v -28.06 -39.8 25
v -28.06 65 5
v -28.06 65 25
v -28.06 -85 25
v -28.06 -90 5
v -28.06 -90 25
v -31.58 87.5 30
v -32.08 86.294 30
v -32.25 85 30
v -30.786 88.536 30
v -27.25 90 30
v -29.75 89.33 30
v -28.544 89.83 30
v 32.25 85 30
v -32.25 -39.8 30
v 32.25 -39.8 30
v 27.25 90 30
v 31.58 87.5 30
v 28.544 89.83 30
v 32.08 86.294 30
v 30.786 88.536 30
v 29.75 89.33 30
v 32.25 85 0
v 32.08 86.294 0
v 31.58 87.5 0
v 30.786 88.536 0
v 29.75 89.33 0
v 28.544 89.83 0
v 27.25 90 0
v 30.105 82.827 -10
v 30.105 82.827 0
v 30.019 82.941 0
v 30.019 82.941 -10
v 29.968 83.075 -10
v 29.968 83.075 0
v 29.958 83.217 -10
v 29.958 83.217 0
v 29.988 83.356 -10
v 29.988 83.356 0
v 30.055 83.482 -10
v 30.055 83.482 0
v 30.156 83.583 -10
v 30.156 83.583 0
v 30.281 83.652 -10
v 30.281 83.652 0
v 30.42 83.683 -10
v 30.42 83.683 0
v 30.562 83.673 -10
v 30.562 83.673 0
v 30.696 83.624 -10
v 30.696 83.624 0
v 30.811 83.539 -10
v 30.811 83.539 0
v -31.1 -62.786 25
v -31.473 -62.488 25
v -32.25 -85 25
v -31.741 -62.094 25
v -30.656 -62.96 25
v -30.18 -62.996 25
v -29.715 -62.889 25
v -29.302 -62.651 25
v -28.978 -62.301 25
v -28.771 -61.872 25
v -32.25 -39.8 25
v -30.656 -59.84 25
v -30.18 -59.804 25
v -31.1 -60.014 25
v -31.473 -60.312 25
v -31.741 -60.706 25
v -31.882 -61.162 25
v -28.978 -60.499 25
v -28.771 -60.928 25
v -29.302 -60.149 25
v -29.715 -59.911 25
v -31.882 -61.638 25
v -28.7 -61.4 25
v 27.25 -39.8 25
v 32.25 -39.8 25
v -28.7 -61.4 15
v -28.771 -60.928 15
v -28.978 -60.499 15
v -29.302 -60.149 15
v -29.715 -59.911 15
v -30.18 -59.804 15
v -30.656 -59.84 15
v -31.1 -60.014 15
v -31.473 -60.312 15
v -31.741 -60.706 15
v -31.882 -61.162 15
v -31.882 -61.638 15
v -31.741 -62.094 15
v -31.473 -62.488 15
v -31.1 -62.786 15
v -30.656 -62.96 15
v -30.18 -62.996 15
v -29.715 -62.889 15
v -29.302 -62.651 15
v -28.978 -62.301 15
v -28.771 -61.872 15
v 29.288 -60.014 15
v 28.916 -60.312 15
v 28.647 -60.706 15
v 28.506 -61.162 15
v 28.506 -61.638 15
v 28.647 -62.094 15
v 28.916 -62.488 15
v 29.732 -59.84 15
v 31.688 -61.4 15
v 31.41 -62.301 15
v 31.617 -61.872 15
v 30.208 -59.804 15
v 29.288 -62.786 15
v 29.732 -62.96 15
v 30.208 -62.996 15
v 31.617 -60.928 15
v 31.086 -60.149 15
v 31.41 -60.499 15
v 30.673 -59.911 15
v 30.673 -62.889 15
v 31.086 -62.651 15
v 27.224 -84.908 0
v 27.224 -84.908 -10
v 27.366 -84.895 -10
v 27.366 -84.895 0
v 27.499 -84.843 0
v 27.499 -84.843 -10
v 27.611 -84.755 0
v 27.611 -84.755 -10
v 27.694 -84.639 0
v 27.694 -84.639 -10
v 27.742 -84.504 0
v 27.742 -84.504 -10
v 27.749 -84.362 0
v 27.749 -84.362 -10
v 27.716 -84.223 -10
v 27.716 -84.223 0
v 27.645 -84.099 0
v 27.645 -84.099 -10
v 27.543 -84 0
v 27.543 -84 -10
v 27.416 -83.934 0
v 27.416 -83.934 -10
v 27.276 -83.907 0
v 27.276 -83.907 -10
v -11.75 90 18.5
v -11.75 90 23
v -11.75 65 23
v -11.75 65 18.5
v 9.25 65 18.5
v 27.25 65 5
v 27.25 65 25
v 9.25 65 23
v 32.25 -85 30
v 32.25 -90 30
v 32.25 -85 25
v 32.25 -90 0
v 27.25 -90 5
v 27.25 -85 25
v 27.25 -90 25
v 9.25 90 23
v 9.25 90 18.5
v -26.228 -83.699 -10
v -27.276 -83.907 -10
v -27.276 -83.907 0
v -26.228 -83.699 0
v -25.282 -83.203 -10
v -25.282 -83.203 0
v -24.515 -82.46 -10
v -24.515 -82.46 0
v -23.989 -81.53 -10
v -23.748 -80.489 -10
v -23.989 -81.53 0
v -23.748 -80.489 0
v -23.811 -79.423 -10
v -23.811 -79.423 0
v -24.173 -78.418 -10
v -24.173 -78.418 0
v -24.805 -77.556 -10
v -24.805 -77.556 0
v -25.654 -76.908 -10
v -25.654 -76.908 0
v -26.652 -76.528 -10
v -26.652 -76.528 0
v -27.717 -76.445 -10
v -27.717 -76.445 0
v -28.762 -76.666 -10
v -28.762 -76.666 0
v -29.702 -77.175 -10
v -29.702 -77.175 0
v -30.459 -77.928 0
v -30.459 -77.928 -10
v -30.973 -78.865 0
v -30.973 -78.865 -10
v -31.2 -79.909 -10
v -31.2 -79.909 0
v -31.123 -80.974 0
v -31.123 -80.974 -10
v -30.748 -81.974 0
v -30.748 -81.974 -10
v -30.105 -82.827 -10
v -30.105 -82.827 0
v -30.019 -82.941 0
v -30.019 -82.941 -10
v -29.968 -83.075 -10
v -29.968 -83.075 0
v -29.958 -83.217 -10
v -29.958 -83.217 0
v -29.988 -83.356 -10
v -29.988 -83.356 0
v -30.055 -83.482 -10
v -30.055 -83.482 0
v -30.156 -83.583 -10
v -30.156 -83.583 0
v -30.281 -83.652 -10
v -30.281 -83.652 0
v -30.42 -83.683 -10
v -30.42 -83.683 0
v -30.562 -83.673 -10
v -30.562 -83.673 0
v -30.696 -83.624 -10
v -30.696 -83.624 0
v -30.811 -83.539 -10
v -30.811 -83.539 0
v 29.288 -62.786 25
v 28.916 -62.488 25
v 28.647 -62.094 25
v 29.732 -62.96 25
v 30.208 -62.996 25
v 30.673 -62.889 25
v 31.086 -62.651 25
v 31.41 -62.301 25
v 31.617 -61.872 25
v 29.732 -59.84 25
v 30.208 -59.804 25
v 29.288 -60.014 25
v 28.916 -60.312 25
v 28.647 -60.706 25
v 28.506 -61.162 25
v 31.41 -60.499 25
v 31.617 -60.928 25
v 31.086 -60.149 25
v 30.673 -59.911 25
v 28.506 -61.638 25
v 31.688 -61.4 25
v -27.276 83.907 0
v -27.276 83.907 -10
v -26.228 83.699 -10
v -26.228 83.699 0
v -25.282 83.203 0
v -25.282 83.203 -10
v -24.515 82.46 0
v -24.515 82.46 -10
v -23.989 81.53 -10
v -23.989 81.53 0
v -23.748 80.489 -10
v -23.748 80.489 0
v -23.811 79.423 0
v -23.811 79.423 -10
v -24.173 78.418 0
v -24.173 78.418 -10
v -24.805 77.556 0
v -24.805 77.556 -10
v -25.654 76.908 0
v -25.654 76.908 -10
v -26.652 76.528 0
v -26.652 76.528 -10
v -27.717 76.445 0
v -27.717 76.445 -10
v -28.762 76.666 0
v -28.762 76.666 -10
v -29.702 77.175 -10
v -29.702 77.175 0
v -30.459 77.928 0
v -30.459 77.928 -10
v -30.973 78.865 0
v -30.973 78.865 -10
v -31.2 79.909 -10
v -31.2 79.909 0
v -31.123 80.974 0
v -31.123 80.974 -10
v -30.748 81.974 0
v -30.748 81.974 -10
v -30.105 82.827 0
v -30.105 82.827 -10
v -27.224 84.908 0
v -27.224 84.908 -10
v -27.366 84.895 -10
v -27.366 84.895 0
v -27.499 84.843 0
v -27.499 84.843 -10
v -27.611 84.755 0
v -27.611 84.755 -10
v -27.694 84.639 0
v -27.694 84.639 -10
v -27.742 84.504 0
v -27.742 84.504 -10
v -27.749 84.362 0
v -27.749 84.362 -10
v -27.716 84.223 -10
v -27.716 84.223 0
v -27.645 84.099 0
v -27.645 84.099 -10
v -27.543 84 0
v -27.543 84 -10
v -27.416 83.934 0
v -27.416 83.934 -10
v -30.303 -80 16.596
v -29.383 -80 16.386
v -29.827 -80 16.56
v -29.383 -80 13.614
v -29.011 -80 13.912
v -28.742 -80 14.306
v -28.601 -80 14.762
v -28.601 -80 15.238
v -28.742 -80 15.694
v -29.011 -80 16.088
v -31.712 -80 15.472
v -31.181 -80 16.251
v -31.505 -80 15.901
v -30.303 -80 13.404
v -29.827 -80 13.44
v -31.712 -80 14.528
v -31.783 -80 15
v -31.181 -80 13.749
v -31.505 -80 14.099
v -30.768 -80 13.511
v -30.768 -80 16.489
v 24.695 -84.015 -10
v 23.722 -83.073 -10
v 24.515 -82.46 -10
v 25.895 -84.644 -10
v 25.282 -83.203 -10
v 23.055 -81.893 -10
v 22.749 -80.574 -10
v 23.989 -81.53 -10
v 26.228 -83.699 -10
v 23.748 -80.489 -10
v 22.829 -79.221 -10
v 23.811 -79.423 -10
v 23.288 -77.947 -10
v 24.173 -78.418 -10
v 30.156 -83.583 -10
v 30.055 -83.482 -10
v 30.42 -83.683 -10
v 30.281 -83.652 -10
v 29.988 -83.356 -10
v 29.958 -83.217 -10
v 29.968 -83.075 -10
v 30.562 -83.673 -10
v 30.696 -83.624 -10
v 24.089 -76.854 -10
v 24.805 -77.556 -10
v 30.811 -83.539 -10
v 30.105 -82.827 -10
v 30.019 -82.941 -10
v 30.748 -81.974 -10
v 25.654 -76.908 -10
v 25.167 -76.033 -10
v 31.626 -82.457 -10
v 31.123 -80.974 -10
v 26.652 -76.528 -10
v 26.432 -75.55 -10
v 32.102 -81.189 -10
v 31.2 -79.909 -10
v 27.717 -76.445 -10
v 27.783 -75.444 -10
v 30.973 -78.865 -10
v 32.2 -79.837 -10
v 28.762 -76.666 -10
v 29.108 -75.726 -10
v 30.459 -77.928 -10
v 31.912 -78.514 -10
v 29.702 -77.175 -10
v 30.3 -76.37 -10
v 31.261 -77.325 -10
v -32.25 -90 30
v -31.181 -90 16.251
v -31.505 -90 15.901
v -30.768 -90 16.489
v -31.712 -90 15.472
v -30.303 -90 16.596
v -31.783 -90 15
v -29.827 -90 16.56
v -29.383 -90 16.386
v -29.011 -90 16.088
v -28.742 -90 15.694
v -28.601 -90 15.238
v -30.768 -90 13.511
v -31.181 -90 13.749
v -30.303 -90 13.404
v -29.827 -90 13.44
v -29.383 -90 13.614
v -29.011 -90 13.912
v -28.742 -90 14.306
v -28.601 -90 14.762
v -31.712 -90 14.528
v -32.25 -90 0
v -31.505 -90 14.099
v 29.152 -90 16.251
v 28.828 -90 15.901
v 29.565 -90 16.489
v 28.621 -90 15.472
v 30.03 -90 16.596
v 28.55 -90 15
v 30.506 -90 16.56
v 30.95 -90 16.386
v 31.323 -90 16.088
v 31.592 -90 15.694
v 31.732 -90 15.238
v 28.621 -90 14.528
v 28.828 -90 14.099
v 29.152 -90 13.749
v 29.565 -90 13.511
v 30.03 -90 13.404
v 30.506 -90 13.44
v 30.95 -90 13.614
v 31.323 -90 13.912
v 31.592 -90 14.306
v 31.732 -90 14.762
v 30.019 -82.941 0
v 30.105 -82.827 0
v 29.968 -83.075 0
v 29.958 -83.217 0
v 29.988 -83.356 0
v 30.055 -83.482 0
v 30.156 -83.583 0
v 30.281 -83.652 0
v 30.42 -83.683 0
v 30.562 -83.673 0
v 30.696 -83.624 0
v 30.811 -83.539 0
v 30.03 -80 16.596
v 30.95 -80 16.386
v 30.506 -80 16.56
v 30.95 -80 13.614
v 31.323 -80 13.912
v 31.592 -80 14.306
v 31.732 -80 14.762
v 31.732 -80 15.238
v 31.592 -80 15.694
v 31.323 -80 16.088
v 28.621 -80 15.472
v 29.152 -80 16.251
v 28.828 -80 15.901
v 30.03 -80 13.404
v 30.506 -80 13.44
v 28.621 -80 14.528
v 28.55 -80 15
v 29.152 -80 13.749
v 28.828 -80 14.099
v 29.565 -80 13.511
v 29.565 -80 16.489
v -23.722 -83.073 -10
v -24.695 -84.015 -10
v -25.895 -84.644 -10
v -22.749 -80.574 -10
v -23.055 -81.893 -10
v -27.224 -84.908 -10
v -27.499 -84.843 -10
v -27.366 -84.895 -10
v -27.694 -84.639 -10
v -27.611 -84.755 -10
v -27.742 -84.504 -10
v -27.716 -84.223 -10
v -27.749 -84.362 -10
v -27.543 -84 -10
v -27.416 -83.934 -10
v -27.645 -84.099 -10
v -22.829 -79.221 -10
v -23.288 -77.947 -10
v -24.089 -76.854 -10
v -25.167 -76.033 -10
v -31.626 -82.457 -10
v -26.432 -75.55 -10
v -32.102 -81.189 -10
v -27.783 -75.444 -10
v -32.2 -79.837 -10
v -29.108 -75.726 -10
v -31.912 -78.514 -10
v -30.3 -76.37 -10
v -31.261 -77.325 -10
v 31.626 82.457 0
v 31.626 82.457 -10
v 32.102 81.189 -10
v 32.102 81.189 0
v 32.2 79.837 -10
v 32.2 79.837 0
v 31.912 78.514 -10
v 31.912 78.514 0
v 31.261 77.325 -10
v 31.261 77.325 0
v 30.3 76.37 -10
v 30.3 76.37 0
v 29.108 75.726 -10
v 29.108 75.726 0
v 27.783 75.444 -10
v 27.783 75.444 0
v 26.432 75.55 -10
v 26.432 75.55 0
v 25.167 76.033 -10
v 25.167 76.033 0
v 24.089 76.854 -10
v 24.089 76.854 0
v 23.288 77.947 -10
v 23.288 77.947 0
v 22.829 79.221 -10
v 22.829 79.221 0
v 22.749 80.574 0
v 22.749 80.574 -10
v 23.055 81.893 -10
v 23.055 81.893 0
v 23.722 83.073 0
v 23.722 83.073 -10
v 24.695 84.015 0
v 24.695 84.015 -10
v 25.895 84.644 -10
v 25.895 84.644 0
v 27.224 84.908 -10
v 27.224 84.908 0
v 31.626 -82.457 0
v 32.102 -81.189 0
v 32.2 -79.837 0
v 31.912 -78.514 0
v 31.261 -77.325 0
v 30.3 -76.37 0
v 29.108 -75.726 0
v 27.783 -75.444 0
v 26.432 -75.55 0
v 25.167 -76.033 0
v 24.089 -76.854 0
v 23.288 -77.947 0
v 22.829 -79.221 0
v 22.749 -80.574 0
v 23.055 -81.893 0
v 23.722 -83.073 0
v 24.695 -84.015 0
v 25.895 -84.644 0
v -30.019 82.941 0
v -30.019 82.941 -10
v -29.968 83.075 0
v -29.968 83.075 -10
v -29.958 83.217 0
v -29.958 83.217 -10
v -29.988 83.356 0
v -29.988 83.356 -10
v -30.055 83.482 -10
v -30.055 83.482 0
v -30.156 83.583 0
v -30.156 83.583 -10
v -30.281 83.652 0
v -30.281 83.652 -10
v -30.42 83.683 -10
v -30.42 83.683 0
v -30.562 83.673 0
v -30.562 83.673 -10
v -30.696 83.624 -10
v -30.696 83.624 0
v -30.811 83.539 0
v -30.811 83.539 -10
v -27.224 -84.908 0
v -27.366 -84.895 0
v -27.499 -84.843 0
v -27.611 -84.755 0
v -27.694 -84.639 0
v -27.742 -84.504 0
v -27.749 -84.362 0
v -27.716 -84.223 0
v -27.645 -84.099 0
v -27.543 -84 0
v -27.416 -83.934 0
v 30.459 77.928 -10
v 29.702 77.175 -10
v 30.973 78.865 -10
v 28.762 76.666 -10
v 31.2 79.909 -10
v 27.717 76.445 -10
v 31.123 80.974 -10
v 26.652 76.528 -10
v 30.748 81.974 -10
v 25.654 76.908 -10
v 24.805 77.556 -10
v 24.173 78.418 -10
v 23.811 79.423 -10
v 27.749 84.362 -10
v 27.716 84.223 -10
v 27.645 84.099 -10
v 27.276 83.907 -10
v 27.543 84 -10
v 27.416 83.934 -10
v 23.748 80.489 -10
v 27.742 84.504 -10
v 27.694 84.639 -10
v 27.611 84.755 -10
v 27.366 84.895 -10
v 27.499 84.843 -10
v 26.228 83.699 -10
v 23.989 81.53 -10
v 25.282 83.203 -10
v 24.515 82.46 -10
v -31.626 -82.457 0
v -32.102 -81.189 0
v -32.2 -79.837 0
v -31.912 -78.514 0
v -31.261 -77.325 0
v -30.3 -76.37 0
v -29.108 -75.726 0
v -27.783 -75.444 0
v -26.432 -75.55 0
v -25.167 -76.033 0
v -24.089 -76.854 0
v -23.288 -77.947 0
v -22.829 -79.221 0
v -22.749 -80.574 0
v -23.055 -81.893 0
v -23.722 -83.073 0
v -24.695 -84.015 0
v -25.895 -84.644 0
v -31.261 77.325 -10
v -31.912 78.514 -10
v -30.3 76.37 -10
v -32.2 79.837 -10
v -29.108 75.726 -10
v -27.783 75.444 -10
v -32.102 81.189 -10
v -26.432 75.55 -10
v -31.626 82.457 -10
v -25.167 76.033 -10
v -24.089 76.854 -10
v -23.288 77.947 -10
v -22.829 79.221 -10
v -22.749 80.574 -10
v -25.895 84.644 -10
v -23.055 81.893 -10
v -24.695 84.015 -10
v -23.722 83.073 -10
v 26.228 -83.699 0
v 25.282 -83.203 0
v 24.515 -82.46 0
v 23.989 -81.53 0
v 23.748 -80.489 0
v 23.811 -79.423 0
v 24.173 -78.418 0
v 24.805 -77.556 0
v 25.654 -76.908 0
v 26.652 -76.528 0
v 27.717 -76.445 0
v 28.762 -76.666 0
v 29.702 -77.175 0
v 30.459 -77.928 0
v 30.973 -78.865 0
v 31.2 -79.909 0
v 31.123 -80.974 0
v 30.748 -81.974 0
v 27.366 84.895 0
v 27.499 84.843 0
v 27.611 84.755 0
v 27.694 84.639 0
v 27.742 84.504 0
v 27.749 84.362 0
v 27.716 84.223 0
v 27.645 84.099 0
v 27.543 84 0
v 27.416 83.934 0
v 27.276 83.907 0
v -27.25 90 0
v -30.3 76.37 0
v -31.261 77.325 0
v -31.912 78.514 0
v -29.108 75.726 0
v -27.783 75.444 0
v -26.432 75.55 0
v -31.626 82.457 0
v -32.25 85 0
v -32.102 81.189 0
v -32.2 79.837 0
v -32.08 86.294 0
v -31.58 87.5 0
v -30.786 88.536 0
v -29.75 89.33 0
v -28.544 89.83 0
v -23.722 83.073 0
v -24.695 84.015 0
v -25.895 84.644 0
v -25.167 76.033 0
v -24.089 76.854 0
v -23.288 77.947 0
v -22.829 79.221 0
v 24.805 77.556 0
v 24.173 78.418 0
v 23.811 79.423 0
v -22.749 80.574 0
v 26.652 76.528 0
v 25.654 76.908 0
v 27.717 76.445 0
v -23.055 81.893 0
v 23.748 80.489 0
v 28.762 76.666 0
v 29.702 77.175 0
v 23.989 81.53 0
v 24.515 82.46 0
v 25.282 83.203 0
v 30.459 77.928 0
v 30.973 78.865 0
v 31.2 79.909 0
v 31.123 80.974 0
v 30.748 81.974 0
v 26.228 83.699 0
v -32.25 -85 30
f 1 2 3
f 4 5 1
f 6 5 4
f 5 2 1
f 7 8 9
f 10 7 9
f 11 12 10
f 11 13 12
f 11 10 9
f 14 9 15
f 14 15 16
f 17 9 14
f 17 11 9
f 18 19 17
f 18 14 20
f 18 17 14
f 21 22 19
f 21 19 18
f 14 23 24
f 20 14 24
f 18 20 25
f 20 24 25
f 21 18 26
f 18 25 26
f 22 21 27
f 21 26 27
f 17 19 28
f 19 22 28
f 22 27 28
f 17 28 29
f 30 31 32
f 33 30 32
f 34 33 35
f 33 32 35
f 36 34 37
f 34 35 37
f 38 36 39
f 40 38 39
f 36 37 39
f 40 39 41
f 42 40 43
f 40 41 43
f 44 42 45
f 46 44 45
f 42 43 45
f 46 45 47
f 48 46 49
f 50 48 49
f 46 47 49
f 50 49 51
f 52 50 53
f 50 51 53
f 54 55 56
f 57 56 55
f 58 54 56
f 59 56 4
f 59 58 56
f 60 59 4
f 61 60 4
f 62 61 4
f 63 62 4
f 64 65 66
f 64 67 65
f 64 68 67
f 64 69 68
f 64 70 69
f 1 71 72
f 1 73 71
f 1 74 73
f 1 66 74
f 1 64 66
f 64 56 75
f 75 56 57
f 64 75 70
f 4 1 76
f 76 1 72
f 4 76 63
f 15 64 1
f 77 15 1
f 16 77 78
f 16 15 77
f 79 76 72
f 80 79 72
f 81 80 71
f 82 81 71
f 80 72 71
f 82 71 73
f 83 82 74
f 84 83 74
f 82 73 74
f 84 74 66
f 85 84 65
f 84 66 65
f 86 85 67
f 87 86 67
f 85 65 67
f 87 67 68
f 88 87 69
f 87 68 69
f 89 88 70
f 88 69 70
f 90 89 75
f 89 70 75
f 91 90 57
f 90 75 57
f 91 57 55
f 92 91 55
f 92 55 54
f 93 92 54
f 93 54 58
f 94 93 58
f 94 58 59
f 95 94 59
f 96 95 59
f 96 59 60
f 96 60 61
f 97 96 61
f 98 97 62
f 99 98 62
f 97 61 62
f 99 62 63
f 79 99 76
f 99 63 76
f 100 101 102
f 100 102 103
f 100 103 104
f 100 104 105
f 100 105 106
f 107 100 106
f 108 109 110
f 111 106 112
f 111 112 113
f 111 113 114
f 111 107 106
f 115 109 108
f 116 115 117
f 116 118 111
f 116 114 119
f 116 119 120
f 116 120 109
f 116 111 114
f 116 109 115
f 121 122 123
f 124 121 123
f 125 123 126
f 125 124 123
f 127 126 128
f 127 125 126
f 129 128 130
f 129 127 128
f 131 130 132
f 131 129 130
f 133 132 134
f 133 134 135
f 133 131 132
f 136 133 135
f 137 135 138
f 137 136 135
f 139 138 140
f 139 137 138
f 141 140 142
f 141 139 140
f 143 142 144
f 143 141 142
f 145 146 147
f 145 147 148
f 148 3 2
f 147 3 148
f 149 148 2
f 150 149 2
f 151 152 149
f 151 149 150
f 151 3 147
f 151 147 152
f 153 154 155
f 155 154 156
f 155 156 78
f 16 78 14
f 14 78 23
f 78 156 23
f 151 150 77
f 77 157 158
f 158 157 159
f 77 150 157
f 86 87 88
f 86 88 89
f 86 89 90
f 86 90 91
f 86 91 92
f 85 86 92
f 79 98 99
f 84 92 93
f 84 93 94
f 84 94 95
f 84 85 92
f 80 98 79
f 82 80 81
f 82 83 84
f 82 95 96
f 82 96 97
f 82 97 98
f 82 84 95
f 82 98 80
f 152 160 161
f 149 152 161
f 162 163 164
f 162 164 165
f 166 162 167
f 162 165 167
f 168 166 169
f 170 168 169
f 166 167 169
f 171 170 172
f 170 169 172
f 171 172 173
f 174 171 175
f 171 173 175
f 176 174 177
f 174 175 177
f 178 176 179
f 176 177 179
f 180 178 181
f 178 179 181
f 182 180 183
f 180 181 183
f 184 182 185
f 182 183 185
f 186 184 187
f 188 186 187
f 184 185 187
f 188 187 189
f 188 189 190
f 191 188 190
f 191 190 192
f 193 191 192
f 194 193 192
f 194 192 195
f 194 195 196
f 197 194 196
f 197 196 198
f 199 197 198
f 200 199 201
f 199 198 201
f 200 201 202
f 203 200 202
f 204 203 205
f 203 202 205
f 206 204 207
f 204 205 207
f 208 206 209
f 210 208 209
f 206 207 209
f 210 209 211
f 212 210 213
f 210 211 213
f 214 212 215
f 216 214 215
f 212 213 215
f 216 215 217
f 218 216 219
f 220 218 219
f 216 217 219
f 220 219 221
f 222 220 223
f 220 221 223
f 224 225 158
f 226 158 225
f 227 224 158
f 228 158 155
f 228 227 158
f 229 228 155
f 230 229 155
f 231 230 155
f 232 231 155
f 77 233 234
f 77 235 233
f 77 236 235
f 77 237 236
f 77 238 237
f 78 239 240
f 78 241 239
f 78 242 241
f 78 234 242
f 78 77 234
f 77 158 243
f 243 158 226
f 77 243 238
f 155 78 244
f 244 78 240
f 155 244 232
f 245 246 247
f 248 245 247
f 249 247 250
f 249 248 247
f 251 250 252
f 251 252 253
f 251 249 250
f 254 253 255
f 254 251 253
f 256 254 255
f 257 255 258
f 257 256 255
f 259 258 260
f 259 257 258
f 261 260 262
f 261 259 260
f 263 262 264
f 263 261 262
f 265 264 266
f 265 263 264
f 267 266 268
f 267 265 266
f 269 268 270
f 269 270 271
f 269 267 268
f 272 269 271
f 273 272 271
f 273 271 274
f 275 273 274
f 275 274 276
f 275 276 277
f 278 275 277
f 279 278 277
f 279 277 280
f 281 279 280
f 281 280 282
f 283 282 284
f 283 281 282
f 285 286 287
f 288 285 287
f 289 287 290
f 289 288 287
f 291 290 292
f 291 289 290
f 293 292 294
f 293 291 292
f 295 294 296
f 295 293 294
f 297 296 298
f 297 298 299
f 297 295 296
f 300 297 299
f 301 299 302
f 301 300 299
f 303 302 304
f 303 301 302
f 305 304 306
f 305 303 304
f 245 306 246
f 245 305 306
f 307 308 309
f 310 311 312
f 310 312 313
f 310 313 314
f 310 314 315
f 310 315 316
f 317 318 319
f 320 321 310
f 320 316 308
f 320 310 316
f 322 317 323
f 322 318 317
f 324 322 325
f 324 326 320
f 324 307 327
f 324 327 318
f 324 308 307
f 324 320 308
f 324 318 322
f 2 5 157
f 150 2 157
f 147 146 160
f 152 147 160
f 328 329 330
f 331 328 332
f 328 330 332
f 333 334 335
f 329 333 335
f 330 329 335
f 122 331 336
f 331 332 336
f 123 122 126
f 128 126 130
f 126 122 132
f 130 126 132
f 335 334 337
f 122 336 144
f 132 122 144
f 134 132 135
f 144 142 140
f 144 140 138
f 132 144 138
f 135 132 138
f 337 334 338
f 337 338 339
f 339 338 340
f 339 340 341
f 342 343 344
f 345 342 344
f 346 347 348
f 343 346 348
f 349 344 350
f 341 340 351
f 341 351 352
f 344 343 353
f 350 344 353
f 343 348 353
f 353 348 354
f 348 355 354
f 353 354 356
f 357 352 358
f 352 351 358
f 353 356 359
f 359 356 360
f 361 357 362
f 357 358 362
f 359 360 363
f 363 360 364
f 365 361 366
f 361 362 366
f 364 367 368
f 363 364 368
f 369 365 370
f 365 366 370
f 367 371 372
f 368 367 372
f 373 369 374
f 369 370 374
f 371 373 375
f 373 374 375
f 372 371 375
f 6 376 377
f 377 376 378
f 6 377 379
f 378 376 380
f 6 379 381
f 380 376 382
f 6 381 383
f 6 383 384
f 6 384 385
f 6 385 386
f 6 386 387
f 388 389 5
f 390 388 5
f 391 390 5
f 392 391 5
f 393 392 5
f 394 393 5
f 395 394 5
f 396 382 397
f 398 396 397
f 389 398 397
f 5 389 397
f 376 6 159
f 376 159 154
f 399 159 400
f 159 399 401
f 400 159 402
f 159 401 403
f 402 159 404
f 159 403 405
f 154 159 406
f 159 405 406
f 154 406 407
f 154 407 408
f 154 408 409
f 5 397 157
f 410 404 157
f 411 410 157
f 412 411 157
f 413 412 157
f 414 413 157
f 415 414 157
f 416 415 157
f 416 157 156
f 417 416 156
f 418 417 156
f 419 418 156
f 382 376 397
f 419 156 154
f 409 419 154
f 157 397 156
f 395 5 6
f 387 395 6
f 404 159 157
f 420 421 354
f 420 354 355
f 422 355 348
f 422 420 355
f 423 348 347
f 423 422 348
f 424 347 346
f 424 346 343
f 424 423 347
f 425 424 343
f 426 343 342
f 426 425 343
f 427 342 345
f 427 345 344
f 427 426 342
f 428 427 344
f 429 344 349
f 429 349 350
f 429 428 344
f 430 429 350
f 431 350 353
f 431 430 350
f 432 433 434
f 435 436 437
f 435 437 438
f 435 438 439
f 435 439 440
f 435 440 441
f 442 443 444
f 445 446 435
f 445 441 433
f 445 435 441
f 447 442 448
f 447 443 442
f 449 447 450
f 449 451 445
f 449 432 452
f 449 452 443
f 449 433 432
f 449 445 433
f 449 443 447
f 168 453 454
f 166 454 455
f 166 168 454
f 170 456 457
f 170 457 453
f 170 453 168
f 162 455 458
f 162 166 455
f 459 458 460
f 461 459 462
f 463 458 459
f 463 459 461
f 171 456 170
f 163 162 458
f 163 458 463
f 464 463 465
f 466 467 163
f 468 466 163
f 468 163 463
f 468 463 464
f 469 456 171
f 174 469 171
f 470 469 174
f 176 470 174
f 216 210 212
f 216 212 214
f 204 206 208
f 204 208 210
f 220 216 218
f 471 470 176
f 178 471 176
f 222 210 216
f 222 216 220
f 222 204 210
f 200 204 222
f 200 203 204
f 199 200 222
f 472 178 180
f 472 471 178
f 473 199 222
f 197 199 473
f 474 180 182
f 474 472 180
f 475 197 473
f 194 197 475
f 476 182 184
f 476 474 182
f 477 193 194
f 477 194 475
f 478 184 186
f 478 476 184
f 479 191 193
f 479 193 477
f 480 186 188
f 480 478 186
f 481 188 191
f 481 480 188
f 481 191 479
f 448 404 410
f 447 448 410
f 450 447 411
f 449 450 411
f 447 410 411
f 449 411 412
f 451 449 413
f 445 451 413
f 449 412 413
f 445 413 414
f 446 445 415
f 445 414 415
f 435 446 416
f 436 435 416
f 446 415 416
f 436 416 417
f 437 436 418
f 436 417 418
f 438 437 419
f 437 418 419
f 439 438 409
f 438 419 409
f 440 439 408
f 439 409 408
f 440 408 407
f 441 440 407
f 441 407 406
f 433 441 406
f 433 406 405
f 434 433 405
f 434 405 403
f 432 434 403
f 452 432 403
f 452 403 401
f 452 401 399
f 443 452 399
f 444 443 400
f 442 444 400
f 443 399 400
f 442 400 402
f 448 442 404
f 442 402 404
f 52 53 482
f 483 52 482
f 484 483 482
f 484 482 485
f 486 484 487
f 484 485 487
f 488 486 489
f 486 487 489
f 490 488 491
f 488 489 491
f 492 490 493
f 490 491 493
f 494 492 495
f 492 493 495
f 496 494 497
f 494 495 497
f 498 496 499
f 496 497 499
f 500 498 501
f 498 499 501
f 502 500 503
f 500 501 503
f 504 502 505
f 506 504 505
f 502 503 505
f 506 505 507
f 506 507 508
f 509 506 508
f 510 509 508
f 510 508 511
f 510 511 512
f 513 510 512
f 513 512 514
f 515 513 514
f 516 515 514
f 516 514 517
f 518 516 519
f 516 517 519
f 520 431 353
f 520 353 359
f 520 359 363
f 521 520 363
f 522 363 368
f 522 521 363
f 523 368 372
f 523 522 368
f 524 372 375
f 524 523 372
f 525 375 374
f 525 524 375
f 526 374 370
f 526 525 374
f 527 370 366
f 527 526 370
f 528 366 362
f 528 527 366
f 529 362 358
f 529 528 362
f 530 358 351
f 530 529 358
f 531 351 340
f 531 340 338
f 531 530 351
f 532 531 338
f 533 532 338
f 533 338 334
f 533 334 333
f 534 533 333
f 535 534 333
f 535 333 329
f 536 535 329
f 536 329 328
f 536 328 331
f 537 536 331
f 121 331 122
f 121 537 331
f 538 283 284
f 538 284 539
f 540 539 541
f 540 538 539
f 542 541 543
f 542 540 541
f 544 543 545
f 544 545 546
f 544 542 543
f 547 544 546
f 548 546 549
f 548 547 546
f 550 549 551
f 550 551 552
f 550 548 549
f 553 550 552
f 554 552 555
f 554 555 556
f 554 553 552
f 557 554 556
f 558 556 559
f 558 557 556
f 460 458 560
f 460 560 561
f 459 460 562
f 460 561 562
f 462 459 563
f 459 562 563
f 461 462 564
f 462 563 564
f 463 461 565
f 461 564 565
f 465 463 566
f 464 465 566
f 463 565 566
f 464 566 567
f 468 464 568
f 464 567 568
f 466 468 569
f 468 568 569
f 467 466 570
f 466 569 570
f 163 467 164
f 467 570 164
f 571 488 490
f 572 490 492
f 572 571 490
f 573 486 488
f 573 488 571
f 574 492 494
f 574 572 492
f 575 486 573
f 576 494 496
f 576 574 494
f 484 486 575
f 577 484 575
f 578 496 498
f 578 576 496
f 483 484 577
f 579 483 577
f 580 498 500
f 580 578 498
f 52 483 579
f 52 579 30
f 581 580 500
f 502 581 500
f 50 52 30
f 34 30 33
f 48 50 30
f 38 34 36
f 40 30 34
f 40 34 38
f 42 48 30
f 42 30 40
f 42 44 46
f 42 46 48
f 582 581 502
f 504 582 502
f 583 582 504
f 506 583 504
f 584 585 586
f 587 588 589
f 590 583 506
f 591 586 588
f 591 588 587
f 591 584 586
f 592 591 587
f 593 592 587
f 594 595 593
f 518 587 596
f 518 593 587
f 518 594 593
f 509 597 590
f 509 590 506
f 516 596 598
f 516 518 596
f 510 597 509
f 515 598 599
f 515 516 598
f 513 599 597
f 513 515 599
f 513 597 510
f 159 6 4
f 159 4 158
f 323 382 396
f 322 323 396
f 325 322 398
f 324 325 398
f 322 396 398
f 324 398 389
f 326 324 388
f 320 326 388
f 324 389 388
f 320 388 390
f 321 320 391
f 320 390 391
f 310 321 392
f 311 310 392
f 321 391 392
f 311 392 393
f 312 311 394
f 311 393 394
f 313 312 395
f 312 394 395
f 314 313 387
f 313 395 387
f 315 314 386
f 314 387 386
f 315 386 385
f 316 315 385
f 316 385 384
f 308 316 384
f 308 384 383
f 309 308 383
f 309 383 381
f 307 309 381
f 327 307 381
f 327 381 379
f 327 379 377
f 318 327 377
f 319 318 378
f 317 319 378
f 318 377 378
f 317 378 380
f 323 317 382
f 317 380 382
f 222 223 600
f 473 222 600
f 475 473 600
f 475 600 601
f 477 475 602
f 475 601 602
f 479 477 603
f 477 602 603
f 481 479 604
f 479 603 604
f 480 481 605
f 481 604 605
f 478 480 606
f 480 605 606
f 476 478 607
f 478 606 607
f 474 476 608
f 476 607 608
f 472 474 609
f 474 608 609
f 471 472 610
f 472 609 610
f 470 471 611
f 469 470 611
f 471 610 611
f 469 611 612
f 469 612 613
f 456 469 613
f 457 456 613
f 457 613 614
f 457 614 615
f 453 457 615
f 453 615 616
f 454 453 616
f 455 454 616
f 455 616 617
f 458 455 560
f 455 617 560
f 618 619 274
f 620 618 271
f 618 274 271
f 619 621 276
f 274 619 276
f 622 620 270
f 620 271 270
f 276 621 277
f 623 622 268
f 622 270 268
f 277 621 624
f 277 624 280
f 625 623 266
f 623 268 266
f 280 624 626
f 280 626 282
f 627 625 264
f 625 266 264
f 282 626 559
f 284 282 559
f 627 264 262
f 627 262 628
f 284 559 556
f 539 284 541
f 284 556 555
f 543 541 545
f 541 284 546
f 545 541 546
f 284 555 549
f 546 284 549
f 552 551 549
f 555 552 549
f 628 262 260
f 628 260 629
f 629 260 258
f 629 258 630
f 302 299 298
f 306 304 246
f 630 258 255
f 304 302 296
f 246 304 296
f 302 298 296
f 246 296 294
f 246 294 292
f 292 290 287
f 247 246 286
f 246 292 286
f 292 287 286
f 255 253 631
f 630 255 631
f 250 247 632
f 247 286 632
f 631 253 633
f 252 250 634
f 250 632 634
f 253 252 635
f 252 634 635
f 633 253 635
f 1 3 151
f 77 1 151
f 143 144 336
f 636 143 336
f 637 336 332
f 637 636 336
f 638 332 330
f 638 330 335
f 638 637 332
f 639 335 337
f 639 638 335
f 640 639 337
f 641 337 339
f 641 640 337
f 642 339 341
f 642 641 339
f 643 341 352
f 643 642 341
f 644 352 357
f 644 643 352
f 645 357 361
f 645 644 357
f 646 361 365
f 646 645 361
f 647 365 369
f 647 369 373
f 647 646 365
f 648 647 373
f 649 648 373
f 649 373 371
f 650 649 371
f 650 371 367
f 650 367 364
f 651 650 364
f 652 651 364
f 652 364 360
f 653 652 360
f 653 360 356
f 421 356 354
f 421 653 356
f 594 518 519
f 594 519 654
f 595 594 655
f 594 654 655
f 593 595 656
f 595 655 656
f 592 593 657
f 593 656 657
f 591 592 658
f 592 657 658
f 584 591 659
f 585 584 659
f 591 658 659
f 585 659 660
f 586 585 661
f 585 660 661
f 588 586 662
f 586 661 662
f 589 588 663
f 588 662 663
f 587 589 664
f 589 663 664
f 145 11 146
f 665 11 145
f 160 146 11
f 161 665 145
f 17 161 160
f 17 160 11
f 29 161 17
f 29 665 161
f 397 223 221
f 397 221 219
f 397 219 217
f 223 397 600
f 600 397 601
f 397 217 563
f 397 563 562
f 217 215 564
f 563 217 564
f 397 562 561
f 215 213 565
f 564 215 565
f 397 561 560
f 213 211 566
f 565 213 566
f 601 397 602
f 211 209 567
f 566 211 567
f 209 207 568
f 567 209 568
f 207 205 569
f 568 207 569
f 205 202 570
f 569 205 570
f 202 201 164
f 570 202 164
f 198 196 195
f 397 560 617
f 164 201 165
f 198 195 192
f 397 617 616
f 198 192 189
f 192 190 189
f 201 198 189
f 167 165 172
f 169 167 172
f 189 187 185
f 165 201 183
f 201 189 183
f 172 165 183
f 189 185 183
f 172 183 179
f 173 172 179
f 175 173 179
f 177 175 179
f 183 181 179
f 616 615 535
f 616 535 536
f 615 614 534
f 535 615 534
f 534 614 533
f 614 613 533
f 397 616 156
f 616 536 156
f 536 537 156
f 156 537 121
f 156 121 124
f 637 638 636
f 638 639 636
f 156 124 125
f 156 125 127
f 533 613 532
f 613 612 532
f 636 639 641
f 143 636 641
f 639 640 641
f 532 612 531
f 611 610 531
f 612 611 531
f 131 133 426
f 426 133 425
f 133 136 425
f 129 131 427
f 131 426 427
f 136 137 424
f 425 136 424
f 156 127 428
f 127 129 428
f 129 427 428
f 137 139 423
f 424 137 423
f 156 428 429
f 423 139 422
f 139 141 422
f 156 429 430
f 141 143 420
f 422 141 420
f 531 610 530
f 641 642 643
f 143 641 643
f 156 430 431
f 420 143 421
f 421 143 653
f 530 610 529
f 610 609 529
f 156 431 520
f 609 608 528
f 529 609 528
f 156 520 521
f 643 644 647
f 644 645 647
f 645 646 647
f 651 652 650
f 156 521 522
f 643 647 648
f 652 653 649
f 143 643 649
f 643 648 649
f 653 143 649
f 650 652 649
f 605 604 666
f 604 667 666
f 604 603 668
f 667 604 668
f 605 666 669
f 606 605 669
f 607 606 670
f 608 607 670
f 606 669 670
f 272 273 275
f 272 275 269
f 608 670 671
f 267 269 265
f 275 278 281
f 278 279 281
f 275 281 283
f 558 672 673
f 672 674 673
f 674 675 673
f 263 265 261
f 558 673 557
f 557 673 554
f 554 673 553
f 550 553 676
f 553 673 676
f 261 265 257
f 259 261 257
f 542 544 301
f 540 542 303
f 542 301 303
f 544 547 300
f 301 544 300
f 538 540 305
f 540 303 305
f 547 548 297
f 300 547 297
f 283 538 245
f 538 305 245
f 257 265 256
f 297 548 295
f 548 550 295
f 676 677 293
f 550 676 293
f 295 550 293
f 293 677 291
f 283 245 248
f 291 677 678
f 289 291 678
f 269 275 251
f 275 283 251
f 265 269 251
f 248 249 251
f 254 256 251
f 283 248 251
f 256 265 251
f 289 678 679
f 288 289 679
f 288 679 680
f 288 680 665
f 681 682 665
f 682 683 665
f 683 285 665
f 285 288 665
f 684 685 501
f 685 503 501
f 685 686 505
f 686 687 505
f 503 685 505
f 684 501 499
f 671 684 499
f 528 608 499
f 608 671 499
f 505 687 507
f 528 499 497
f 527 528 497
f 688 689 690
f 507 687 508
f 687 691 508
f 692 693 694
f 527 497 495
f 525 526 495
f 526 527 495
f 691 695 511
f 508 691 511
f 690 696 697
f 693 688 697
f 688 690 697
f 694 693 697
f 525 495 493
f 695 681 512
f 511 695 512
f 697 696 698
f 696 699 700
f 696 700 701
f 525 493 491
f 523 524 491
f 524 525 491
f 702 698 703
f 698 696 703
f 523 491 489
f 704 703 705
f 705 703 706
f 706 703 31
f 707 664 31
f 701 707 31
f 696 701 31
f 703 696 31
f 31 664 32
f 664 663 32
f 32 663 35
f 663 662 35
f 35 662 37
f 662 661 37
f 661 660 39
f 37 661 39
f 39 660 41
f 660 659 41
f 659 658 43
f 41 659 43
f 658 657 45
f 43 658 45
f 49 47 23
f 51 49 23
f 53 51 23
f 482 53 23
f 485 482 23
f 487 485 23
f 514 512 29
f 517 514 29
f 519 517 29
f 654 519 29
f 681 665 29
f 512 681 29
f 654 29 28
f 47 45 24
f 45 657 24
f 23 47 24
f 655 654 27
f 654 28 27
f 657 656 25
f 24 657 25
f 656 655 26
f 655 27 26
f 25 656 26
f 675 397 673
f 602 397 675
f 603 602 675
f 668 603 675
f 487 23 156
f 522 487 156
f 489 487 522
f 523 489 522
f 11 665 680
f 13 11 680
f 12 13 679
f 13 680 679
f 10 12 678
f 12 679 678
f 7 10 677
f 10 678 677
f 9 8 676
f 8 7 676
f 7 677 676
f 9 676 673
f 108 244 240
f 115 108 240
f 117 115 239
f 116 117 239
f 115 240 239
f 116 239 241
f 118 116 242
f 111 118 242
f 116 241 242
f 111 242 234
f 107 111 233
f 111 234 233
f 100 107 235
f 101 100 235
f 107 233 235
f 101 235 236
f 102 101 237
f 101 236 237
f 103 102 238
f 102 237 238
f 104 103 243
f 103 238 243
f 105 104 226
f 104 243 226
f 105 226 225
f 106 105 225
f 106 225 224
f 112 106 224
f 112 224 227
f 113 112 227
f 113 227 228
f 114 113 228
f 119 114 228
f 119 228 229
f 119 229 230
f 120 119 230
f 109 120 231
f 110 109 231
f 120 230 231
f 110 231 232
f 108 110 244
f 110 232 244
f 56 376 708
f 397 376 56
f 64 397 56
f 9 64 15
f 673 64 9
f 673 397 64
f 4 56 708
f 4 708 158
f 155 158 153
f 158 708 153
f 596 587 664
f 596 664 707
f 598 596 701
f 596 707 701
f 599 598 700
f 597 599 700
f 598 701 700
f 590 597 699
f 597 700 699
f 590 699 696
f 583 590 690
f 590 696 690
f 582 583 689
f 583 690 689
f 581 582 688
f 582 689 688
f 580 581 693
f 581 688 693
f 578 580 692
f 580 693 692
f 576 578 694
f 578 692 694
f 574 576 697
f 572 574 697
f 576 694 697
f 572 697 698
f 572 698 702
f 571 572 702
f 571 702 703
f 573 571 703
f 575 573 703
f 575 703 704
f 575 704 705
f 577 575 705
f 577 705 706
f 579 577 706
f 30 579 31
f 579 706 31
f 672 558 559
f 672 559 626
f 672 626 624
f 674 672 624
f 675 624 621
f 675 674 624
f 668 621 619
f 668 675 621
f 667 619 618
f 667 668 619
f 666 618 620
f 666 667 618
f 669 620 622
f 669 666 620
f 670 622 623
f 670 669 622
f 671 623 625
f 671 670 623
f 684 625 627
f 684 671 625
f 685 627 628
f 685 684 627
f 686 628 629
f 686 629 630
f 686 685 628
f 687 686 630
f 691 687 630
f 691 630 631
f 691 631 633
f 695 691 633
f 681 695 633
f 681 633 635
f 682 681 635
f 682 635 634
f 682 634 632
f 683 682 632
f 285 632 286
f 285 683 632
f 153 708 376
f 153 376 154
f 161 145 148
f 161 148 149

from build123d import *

# Parameters (mm, degrees)
CROQUIS1_W              = 64.5
CROQUIS1_H              = 180
SALIENTE_EXTRUIR1_DEPTH = 30
CROQUIS2_W              = 55.309973817
CROQUIS2_H              = 20
CORTAR_EXTRUIR1_DEPTH   = 155
CORTAR_EXTRUIR2_DEPTH   = 155
CORTAR_EXTRUIR4_DEPTH   = 155
CROQUIS12_R             = 1.6
CORTAR_EXTRUIR8_DEPTH   = 10
SALIENTE_EXTRUIR2_DEPTH = 10
CROQUIS9_W              = 64.5
CROQUIS9_H              = 45.2
CORTAR_EXTRUIR10_DEPTH  = 5
CROQUIS15_R             = 1.6
CORTAR_EXTRUIR11_DEPTH  = 10
CORTAR_EXTRUIR12_REACH  = 187.311
CROQUIS18_W             = 21
CROQUIS18_H             = 4.5


with BuildPart() as part:
    # Croquis1 → Saliente-Extruir1 (new body)
    with BuildSketch(Plane.XY):
        Rectangle(CROQUIS1_W, CROQUIS1_H)
    extrude(amount=SALIENTE_EXTRUIR1_DEPTH)

    # Croquis2 → Cortar-Extruir1 (cut)
    with BuildSketch(Plane.XZ.offset(90)):
        with Locations((-0.404986909, 15)):
            Rectangle(CROQUIS2_W, CROQUIS2_H)
    extrude(amount=-CORTAR_EXTRUIR1_DEPTH, mode=Mode.SUBTRACT)

    # Croquis3 → Cortar-Extruir2 (cut)
    with BuildSketch(Plane(origin=(0, 0, 0), x_dir=(-1, 0, 0), z_dir=(0, 0, -1))):
        with BuildLine():
            Line((-27.25, 90), (-32.25, 90))
            Line((-32.25, 90), (-32.25, 85))
            ThreePointArc((-32.25, 85), (-30.785533906, 88.535533906), (-27.25, 90))
        make_face()
    extrude(amount=-CORTAR_EXTRUIR2_DEPTH, mode=Mode.SUBTRACT)

    # Croquis3<4> → Cortar-Extruir4 (cut)
    with BuildSketch(Plane(origin=(0, 0, 0), x_dir=(-1, 0, 0), z_dir=(0, 0, -1))):
        with BuildLine():
            Line((32.25, 90), (27.25, 90))
            ThreePointArc((27.25, 90), (30.785533906, 88.535533906), (32.25, 85))
            Line((32.25, 85), (32.25, 90))
        make_face()
    extrude(amount=-CORTAR_EXTRUIR4_DEPTH, mode=Mode.SUBTRACT)

    # Croquis12 → Cortar-Extruir8 (cut)
    with BuildSketch(Plane(origin=(0, -90, 0), x_dir=(-1, 0, 0), z_dir=(0, -1, 0))):
        with Locations((30.183391147, -15)):
            Circle(CROQUIS12_R)
        with Locations((-30.15, -15)):
            Circle(CROQUIS12_R)
    extrude(amount=-CORTAR_EXTRUIR8_DEPTH, mode=Mode.SUBTRACT)

    # Croquis14 → Saliente-Extruir2 (add)
    with BuildSketch(Plane(origin=(0, 0, 0), x_dir=(-1, 0, 0), z_dir=(0, 0, -1))):
        with BuildLine():
            ThreePointArc((-30.810899687, 83.538949092), (-25.782194726, 75.745600208), (-27.223730255, 84.90781259))
            ThreePointArc((-27.223730255, 84.90781259), (-27.750555098, 84.433527237), (-27.276269745, 83.906702394))
            ThreePointArc((-27.276269745, 83.906702394), (-26.139605296, 76.682210963), (-30.104786891, 82.827340533))
            ThreePointArc((-30.104786891, 82.827340533), (-30.102039009, 83.53620121), (-30.810899687, 83.538949092))
        make_face()
        with BuildLine():
            ThreePointArc((30.810899687, 83.538949092), (25.782194726, 75.745600208), (27.223730255, 84.90781259))
            ThreePointArc((27.223730255, 84.90781259), (27.750555098, 84.433527237), (27.276269745, 83.906702394))
            ThreePointArc((27.276269745, 83.906702394), (26.139605296, 76.682210963), (30.104786891, 82.827340533))
            ThreePointArc((30.104786891, 82.827340533), (30.102039009, 83.53620121), (30.810899687, 83.538949092))
        make_face()
        with BuildLine():
            ThreePointArc((30.810899687, -83.538949092), (25.782194726, -75.745600208), (27.223730255, -84.90781259))
            ThreePointArc((27.223730255, -84.90781259), (27.750555098, -84.433527237), (27.276269745, -83.906702394))
            ThreePointArc((27.276269745, -83.906702394), (26.139605296, -76.682210963), (30.104786891, -82.827340533))
            ThreePointArc((30.104786891, -82.827340533), (30.102039009, -83.53620121), (30.810899687, -83.538949092))
        make_face()
        with BuildLine():
            ThreePointArc((-30.810899687, -83.538949092), (-25.782194726, -75.745600208), (-27.223730255, -84.90781259))
            ThreePointArc((-27.223730255, -84.90781259), (-27.750555098, -84.433527237), (-27.276269745, -83.906702394))
            ThreePointArc((-27.276269745, -83.906702394), (-26.139605296, -76.682210963), (-30.104786891, -82.827340533))
            ThreePointArc((-30.104786891, -82.827340533), (-30.102039009, -83.53620121), (-30.810899687, -83.538949092))
        make_face()
    extrude(amount=SALIENTE_EXTRUIR2_DEPTH)

    # Croquis9 → Cortar-Extruir10 (cut)
    with BuildSketch(Plane.XY.offset(30)):
        with Locations((0, -62.4)):
            Rectangle(CROQUIS9_W, CROQUIS9_H)
    extrude(amount=-CORTAR_EXTRUIR10_DEPTH, mode=Mode.SUBTRACT)

    # Croquis15 → Cortar-Extruir11 (cut)
    with BuildSketch(Plane.XY.offset(25)):
        with Locations((30.088495575, -61.4)):
            Circle(CROQUIS15_R)
        with Locations((-30.299948917, -61.4)):
            Circle(CROQUIS15_R)
    extrude(amount=-CORTAR_EXTRUIR11_DEPTH, mode=Mode.SUBTRACT)

    # Croquis18 → Cortar-Extruir12 (cut, up to next)
    with BuildSketch(Plane(origin=(0, 90, 0), x_dir=(1, 0, 0), z_dir=(0, 1, 0)), mode=Mode.PRIVATE) as cortar_extruir12_sk1:
        with Locations((-1.25, -20.75)):
            Rectangle(CROQUIS18_W, CROQUIS18_H)
    cortar_extruir12_tool1 = extrude(cortar_extruir12_sk1.sketch, amount=-CORTAR_EXTRUIR12_REACH, mode=Mode.PRIVATE) & part.part
    add(cortar_extruir12_tool1.solids().sort_by_distance((-1.25, 90, 20.75))[0], mode=Mode.SUBTRACT)


solid = part.part
